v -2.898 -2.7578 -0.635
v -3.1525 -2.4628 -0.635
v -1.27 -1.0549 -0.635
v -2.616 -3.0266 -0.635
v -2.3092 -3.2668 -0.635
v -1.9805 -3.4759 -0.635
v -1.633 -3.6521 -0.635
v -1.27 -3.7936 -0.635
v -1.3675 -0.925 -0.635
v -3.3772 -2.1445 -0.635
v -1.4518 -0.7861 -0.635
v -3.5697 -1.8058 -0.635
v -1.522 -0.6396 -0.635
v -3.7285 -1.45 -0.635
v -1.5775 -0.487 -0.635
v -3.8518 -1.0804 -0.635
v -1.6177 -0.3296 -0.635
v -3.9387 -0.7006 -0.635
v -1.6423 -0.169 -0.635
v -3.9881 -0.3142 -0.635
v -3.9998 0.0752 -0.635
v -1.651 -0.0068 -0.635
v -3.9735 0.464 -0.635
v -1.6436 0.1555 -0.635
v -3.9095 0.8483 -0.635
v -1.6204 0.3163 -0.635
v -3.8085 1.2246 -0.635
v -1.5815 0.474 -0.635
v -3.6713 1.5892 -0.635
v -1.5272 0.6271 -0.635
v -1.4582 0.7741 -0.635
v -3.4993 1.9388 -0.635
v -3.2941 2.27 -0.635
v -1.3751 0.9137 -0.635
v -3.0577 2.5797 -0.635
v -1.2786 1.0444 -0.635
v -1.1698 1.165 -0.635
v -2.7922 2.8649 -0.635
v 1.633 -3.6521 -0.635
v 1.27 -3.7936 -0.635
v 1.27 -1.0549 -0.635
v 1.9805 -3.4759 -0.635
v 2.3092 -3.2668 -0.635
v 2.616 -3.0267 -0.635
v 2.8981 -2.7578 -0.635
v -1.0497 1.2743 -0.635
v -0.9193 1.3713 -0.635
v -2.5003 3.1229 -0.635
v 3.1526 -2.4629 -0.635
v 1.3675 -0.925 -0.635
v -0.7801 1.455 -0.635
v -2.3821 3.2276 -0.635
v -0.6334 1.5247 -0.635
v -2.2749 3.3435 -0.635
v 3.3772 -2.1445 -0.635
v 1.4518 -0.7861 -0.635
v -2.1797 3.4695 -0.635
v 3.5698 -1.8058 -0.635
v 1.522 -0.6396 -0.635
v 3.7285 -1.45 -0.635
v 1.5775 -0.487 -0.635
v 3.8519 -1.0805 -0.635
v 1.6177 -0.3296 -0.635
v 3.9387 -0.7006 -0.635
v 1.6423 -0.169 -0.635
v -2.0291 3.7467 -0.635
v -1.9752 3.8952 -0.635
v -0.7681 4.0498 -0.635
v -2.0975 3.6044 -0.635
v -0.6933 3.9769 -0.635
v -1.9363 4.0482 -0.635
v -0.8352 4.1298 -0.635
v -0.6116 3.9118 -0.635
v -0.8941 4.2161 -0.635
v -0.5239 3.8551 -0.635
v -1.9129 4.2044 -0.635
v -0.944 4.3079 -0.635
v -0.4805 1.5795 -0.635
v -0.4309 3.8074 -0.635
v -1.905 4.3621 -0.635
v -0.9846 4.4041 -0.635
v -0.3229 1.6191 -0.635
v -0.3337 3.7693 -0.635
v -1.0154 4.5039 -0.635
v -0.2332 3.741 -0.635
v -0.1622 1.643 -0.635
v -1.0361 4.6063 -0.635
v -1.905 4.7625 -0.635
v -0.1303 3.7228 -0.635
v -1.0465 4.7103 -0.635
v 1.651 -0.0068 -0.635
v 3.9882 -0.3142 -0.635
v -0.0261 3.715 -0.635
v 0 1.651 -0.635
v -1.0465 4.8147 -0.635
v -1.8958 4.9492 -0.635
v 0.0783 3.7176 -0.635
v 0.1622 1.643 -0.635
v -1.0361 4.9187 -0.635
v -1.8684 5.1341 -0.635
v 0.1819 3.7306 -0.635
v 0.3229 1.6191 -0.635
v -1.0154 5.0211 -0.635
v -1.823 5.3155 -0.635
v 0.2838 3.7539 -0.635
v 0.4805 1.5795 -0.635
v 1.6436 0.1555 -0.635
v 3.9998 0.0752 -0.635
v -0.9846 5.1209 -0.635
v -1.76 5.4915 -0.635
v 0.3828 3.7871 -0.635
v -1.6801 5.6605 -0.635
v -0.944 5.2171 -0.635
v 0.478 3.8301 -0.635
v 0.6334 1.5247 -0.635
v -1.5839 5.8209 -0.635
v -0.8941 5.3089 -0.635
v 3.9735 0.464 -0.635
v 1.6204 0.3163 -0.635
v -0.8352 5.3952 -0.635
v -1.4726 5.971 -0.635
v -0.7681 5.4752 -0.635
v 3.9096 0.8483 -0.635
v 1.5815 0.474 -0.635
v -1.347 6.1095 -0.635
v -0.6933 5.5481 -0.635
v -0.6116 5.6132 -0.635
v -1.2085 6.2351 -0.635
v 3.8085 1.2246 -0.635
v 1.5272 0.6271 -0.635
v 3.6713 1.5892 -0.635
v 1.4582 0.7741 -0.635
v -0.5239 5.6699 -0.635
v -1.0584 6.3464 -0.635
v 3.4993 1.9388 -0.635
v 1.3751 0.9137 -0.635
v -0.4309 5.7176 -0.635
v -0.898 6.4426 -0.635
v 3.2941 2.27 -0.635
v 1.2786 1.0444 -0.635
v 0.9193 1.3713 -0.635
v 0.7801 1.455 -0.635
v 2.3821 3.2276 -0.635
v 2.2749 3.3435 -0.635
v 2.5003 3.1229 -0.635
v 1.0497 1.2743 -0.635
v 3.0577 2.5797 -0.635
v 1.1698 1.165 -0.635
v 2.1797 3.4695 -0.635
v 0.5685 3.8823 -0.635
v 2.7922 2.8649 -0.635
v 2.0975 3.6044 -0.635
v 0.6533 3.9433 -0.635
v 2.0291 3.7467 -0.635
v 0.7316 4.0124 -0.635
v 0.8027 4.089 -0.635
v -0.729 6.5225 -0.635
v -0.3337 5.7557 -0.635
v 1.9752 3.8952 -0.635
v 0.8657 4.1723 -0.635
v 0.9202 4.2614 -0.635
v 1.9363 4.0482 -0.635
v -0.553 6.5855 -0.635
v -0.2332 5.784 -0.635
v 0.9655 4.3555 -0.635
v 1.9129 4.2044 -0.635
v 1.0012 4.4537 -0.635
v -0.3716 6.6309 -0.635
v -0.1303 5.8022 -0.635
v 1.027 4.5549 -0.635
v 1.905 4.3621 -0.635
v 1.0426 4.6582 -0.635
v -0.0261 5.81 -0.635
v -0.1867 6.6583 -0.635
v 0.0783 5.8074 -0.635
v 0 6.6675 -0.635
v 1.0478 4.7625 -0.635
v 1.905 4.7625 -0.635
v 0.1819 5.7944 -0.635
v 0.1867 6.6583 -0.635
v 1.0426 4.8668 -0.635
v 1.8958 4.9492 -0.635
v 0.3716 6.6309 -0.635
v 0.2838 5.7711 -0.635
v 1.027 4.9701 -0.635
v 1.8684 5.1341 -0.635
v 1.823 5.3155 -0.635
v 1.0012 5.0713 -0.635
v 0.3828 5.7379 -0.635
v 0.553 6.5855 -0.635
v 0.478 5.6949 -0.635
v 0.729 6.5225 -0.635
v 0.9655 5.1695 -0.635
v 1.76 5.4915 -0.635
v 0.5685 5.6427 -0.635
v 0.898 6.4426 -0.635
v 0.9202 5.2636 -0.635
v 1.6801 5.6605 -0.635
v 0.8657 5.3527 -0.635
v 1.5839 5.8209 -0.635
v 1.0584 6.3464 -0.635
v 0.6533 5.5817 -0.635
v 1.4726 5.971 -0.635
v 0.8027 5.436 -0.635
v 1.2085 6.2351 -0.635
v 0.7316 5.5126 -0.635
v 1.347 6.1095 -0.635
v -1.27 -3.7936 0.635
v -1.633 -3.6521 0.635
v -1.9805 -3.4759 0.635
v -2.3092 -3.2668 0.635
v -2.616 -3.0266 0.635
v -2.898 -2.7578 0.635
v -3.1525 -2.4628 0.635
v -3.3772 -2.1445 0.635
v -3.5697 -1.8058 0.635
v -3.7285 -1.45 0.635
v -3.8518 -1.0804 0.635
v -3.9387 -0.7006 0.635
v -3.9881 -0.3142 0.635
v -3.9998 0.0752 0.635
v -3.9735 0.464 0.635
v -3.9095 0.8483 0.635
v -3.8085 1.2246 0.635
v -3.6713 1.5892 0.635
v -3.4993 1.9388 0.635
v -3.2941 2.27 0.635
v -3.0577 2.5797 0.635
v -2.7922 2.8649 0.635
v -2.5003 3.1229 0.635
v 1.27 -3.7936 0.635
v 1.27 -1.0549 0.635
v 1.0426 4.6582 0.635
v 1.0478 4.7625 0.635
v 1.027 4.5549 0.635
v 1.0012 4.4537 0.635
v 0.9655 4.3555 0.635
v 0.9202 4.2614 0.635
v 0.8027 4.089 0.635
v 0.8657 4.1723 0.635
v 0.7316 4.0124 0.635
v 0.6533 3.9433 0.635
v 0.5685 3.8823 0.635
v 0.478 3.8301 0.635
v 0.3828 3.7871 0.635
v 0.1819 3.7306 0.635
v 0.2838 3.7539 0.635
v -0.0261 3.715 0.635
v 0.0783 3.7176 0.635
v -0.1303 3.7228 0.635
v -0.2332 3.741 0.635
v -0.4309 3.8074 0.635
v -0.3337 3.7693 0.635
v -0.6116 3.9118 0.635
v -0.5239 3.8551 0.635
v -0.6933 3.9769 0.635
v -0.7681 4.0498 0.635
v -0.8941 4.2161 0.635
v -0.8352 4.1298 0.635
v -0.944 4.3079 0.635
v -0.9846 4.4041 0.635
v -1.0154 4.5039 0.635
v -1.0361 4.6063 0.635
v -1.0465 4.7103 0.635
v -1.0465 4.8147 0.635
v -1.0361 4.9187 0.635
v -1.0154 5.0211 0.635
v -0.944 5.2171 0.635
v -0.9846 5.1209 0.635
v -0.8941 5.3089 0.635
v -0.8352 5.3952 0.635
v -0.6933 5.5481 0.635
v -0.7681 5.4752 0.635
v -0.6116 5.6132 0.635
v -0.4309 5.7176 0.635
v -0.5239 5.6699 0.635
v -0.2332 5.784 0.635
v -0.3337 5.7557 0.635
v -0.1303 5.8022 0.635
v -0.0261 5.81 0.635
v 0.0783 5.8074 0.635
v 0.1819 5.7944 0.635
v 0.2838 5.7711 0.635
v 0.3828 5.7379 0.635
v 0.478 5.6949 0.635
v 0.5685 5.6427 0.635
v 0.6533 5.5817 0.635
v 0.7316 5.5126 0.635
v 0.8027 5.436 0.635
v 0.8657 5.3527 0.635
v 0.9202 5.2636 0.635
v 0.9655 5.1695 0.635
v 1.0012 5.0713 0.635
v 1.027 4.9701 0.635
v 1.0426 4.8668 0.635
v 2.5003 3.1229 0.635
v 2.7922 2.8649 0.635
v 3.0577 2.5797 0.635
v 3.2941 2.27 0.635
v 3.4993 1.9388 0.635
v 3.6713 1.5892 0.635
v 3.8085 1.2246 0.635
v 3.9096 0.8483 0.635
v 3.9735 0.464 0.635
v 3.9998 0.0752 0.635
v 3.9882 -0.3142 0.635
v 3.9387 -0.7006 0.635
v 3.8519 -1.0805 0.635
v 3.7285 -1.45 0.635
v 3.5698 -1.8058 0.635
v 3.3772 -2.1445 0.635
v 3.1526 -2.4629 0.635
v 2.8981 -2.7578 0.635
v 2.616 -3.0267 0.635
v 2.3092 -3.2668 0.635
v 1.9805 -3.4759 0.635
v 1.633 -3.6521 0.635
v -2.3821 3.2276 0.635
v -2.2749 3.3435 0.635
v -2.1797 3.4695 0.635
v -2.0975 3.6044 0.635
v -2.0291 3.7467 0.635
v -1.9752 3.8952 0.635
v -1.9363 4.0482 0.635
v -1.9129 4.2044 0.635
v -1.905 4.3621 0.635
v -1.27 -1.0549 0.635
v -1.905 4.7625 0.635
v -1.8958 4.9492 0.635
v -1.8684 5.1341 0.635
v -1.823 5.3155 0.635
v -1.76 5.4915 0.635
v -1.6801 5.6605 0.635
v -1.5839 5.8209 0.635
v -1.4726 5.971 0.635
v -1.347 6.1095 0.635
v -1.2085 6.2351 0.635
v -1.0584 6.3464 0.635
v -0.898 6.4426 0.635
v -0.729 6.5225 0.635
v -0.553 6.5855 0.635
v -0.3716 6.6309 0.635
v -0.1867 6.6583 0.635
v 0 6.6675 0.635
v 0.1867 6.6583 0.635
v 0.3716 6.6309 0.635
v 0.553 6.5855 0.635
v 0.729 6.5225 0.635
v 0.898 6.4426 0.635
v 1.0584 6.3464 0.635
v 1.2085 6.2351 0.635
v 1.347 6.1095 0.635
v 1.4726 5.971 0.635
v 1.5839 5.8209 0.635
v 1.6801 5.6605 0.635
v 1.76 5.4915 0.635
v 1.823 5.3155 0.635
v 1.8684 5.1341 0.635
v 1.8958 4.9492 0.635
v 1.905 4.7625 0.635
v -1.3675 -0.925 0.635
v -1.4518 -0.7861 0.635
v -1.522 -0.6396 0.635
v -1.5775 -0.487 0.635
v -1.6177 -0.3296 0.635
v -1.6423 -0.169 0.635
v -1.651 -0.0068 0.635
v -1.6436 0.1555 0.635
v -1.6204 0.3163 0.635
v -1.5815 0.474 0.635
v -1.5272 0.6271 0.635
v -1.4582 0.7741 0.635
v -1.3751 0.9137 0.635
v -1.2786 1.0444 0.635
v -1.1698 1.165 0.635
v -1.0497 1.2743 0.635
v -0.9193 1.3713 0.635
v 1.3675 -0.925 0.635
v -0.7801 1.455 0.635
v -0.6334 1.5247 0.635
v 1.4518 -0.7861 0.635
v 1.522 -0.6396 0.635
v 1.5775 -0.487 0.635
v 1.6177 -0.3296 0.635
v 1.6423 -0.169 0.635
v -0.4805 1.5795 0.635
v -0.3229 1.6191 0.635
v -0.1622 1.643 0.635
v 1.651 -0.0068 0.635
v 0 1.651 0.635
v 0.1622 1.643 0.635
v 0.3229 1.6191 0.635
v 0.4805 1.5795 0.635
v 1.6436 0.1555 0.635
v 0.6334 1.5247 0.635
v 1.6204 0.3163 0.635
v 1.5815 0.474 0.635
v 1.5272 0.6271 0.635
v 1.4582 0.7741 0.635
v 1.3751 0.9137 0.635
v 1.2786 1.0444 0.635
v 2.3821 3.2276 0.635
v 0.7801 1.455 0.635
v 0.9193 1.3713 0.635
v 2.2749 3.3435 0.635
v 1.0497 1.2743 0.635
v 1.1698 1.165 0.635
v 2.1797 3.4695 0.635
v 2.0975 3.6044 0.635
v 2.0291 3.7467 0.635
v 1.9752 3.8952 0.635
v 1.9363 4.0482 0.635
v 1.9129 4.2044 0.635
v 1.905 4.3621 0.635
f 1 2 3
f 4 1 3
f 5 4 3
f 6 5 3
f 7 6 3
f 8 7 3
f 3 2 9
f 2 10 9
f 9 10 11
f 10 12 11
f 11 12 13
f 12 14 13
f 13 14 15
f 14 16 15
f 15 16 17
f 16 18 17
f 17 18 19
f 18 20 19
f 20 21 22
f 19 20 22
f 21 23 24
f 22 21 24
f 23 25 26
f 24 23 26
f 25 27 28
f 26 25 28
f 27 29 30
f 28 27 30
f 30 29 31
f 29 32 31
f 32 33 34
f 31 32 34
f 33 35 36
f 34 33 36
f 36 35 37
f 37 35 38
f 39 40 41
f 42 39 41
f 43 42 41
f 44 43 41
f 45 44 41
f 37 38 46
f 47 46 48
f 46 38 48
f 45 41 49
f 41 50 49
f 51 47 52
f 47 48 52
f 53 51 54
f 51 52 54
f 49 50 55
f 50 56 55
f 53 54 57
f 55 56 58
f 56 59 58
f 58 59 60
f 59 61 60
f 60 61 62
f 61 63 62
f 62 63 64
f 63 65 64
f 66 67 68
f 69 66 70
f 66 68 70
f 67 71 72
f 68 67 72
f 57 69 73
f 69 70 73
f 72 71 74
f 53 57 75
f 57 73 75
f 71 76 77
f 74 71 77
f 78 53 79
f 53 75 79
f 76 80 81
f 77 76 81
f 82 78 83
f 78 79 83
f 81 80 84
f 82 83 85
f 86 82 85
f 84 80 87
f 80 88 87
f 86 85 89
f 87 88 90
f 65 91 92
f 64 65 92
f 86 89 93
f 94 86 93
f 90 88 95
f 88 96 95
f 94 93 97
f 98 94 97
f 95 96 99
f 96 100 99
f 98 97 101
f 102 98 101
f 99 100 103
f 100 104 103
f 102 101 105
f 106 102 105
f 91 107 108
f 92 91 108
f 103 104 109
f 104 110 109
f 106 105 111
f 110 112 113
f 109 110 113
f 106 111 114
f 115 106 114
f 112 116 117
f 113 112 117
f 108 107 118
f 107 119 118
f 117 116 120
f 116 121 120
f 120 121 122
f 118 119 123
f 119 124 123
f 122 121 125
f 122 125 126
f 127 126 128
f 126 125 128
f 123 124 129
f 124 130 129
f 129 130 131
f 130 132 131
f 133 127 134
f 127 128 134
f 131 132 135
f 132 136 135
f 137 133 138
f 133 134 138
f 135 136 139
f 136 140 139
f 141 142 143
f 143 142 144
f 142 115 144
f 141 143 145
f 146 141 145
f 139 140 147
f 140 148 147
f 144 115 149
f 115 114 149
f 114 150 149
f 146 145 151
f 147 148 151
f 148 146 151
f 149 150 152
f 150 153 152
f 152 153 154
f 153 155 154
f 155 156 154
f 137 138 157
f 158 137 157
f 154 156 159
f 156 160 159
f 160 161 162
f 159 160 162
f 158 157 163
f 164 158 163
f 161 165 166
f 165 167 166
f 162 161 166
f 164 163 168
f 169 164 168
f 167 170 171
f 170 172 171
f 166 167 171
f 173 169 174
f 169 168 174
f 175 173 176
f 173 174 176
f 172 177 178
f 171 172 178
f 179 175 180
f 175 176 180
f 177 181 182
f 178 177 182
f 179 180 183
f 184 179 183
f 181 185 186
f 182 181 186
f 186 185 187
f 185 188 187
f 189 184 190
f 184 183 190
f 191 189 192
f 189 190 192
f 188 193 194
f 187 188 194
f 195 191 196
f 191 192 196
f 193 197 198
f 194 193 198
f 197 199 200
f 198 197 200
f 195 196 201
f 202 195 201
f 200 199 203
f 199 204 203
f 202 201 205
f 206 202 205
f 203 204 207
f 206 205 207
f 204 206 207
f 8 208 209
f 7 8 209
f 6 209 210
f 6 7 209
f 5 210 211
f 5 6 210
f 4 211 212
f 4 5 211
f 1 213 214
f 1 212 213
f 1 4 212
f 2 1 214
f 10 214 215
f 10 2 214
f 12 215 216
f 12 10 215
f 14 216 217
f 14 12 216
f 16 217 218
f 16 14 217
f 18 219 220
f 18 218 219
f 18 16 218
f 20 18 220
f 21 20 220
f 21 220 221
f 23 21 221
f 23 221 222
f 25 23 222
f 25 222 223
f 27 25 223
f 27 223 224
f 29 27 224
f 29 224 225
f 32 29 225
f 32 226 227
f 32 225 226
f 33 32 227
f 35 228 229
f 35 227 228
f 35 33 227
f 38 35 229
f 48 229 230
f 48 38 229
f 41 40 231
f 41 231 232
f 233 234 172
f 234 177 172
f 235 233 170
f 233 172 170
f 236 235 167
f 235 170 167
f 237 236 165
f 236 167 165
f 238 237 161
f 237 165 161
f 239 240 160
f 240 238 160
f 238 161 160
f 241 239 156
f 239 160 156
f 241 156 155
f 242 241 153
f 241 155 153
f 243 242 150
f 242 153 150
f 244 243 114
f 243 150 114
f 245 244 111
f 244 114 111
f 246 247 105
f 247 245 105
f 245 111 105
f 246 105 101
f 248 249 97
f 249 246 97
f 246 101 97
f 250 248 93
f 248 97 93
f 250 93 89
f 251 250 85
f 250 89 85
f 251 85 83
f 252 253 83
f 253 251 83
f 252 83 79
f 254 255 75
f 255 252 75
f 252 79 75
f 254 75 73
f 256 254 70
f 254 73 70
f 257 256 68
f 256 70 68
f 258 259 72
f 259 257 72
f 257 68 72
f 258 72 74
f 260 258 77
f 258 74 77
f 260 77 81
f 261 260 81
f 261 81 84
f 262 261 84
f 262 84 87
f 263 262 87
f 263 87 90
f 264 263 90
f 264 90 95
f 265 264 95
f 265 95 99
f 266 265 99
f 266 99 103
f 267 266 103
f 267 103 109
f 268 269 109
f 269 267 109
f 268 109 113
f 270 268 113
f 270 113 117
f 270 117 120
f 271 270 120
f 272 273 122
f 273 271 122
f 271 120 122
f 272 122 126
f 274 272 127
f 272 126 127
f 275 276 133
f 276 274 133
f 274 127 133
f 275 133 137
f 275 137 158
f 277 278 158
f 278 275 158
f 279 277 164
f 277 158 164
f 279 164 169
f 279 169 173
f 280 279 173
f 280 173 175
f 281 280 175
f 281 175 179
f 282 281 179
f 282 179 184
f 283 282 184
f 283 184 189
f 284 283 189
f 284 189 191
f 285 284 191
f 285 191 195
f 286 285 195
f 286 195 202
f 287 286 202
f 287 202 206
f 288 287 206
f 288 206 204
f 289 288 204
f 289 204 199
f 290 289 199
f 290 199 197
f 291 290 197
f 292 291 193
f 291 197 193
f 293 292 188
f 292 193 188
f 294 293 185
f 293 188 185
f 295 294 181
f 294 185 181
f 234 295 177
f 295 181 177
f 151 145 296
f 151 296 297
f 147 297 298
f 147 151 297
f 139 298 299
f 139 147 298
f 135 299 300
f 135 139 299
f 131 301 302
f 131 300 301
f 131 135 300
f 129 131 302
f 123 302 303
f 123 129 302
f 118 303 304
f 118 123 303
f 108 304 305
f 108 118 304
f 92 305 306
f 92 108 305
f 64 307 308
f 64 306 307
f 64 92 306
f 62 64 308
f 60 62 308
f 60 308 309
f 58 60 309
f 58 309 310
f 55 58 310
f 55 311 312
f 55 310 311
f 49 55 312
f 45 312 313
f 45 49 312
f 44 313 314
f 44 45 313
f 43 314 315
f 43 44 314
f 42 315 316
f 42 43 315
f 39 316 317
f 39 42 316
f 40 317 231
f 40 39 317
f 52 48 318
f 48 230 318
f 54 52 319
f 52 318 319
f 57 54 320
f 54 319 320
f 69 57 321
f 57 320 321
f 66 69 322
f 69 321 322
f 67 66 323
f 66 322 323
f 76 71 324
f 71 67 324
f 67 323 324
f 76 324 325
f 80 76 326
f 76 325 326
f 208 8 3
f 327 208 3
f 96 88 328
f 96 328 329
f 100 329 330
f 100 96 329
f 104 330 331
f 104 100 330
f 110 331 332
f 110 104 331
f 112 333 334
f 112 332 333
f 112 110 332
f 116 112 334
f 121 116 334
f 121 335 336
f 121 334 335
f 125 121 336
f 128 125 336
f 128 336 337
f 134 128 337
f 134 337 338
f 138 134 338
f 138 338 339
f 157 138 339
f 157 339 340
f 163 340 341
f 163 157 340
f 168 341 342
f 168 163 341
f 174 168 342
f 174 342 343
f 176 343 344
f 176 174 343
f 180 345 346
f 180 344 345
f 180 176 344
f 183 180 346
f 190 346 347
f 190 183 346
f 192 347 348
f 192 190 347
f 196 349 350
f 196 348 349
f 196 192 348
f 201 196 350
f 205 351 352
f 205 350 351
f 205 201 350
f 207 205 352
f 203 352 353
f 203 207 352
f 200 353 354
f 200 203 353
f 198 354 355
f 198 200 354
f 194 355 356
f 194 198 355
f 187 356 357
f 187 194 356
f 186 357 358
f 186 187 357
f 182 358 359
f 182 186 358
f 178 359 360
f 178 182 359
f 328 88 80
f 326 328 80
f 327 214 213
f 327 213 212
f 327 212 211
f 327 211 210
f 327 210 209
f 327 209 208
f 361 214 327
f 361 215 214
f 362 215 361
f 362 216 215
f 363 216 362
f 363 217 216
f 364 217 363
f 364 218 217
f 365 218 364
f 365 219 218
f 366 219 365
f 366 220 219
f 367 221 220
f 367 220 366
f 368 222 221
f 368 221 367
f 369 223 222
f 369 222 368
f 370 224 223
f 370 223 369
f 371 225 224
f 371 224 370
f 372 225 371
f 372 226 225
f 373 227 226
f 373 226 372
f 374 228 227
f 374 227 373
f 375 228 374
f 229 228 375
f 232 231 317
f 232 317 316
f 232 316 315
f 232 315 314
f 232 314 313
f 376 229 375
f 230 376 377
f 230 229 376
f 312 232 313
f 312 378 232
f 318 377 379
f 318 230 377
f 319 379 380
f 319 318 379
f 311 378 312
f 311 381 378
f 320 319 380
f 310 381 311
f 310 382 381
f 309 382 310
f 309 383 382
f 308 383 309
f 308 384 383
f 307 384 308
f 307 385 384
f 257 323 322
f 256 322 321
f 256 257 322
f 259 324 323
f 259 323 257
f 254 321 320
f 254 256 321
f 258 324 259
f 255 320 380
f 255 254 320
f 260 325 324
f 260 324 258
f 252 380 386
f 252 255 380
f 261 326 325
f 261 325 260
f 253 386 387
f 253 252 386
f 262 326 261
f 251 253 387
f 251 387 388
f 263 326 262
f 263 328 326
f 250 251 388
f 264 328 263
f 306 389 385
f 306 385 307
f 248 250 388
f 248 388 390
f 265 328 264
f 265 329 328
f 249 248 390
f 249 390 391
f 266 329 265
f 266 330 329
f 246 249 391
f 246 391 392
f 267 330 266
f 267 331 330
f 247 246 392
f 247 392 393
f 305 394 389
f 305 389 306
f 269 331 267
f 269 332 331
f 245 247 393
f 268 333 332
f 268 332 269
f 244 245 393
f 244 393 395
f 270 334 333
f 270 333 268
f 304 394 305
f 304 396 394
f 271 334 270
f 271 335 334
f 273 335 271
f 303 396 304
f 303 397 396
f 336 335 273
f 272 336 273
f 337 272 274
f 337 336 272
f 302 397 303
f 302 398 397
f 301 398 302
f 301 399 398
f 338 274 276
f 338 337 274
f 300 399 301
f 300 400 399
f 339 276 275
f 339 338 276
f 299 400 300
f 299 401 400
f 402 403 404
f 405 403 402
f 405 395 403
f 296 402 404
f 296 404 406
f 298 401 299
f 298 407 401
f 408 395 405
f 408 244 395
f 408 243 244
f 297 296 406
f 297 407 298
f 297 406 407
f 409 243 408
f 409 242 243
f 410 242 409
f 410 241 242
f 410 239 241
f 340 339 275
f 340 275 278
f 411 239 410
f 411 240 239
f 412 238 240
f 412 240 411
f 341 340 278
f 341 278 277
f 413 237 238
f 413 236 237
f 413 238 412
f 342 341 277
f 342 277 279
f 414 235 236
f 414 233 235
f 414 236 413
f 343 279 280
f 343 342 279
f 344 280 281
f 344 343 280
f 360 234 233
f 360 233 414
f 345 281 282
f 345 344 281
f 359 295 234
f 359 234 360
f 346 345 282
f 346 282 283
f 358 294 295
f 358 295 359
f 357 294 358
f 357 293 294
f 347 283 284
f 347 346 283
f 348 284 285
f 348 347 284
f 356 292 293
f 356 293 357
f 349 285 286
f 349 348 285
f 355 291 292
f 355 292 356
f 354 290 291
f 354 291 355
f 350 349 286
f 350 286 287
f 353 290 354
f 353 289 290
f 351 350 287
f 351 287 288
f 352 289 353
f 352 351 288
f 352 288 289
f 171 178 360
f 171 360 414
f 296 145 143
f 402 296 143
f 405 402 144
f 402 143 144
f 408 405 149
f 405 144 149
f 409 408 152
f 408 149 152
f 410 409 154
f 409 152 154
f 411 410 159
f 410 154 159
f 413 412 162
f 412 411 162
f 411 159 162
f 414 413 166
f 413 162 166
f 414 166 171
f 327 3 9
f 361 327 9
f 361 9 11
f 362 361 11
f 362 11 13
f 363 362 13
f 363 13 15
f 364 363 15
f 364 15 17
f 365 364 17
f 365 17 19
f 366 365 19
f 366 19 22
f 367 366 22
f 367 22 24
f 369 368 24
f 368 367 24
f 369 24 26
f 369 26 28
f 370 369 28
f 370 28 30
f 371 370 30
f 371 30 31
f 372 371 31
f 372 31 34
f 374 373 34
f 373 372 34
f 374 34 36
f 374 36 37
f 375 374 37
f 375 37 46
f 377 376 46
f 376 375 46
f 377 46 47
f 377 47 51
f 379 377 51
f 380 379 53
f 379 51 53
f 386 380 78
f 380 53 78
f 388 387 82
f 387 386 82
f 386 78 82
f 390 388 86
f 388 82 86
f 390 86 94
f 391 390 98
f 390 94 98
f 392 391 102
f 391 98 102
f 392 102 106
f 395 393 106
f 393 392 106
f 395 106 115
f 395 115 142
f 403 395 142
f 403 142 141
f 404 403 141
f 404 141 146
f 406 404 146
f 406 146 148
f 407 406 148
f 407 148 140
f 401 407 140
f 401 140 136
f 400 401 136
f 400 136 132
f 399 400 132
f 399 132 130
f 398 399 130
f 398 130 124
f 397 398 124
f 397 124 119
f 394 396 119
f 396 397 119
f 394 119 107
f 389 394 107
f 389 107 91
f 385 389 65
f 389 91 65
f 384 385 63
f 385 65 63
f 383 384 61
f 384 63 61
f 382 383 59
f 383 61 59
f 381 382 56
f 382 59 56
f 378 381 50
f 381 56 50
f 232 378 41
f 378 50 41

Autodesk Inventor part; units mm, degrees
ref_plane "YZ Plane" through (0, 0, 0) normal (1, 0, 0) x (0, 1, 0)
ref_plane "XZ Plane" through (0, 0, 0) normal (0, 1, 0) x (-1, 0, 0)
ref_plane "XY Plane" through (0, 0, 0) normal (0, 0, 1) x (1, 0, 0)
sketch "Sketch1" plane through (0, 0, 0) normal (0, 0, 1) x (1, 0, 0)
  circle A0 centre (0, 0) radius 1.651 construction
  circle A1 centre (0, 4.7625) radius 1.0478
  arc A2 (1.905, 4.7625) -> (-1.905, 4.7625) centre (0, 4.7625) ccw
  line L0 (-1.905, 4.7625) -> (-1.905, 3.5178)
  line L1 (1.905, 4.7625) -> (1.905, 3.5178)
  arc A3 (-1.905, 3.5178) -> (-1.27, -3.7936) centre (0, 0) ccw
  line L2 (-1.27, -3.7936) -> (-1.27, -1.0549)
  line L3 (-6.0242, 0) -> (6.0242, 0) construction
  line L4 (0, -6.1357) -> (0, 8.8014) construction
  arc A4 (1.27, -3.7936) -> (1.905, 3.5178) centre (0, 0) ccw
  line L5 (1.27, -3.7936) -> (1.27, -1.0549)
  arc A5 (1.27, -1.0549) -> (-1.27, -1.0549) centre (0, 0) ccw
  dimension "d0" = 3.302
  dimension "d1" = 2.0955
  dimension "d2" = 4.7625
  dimension "d3" = 1.905
  dimension "d4" = 4.0005
  dimension "d5" = 2.54
extrude "Extrusion1" add sketch "Sketch1" along normal mid plane 1.27
fillet "Fillet1" radius 1.5875 2 edges at (1.905, 3.5178, 0) (-1.905, 3.5178, 0)
properties part number "Front Suspension Adjustment Clip"
